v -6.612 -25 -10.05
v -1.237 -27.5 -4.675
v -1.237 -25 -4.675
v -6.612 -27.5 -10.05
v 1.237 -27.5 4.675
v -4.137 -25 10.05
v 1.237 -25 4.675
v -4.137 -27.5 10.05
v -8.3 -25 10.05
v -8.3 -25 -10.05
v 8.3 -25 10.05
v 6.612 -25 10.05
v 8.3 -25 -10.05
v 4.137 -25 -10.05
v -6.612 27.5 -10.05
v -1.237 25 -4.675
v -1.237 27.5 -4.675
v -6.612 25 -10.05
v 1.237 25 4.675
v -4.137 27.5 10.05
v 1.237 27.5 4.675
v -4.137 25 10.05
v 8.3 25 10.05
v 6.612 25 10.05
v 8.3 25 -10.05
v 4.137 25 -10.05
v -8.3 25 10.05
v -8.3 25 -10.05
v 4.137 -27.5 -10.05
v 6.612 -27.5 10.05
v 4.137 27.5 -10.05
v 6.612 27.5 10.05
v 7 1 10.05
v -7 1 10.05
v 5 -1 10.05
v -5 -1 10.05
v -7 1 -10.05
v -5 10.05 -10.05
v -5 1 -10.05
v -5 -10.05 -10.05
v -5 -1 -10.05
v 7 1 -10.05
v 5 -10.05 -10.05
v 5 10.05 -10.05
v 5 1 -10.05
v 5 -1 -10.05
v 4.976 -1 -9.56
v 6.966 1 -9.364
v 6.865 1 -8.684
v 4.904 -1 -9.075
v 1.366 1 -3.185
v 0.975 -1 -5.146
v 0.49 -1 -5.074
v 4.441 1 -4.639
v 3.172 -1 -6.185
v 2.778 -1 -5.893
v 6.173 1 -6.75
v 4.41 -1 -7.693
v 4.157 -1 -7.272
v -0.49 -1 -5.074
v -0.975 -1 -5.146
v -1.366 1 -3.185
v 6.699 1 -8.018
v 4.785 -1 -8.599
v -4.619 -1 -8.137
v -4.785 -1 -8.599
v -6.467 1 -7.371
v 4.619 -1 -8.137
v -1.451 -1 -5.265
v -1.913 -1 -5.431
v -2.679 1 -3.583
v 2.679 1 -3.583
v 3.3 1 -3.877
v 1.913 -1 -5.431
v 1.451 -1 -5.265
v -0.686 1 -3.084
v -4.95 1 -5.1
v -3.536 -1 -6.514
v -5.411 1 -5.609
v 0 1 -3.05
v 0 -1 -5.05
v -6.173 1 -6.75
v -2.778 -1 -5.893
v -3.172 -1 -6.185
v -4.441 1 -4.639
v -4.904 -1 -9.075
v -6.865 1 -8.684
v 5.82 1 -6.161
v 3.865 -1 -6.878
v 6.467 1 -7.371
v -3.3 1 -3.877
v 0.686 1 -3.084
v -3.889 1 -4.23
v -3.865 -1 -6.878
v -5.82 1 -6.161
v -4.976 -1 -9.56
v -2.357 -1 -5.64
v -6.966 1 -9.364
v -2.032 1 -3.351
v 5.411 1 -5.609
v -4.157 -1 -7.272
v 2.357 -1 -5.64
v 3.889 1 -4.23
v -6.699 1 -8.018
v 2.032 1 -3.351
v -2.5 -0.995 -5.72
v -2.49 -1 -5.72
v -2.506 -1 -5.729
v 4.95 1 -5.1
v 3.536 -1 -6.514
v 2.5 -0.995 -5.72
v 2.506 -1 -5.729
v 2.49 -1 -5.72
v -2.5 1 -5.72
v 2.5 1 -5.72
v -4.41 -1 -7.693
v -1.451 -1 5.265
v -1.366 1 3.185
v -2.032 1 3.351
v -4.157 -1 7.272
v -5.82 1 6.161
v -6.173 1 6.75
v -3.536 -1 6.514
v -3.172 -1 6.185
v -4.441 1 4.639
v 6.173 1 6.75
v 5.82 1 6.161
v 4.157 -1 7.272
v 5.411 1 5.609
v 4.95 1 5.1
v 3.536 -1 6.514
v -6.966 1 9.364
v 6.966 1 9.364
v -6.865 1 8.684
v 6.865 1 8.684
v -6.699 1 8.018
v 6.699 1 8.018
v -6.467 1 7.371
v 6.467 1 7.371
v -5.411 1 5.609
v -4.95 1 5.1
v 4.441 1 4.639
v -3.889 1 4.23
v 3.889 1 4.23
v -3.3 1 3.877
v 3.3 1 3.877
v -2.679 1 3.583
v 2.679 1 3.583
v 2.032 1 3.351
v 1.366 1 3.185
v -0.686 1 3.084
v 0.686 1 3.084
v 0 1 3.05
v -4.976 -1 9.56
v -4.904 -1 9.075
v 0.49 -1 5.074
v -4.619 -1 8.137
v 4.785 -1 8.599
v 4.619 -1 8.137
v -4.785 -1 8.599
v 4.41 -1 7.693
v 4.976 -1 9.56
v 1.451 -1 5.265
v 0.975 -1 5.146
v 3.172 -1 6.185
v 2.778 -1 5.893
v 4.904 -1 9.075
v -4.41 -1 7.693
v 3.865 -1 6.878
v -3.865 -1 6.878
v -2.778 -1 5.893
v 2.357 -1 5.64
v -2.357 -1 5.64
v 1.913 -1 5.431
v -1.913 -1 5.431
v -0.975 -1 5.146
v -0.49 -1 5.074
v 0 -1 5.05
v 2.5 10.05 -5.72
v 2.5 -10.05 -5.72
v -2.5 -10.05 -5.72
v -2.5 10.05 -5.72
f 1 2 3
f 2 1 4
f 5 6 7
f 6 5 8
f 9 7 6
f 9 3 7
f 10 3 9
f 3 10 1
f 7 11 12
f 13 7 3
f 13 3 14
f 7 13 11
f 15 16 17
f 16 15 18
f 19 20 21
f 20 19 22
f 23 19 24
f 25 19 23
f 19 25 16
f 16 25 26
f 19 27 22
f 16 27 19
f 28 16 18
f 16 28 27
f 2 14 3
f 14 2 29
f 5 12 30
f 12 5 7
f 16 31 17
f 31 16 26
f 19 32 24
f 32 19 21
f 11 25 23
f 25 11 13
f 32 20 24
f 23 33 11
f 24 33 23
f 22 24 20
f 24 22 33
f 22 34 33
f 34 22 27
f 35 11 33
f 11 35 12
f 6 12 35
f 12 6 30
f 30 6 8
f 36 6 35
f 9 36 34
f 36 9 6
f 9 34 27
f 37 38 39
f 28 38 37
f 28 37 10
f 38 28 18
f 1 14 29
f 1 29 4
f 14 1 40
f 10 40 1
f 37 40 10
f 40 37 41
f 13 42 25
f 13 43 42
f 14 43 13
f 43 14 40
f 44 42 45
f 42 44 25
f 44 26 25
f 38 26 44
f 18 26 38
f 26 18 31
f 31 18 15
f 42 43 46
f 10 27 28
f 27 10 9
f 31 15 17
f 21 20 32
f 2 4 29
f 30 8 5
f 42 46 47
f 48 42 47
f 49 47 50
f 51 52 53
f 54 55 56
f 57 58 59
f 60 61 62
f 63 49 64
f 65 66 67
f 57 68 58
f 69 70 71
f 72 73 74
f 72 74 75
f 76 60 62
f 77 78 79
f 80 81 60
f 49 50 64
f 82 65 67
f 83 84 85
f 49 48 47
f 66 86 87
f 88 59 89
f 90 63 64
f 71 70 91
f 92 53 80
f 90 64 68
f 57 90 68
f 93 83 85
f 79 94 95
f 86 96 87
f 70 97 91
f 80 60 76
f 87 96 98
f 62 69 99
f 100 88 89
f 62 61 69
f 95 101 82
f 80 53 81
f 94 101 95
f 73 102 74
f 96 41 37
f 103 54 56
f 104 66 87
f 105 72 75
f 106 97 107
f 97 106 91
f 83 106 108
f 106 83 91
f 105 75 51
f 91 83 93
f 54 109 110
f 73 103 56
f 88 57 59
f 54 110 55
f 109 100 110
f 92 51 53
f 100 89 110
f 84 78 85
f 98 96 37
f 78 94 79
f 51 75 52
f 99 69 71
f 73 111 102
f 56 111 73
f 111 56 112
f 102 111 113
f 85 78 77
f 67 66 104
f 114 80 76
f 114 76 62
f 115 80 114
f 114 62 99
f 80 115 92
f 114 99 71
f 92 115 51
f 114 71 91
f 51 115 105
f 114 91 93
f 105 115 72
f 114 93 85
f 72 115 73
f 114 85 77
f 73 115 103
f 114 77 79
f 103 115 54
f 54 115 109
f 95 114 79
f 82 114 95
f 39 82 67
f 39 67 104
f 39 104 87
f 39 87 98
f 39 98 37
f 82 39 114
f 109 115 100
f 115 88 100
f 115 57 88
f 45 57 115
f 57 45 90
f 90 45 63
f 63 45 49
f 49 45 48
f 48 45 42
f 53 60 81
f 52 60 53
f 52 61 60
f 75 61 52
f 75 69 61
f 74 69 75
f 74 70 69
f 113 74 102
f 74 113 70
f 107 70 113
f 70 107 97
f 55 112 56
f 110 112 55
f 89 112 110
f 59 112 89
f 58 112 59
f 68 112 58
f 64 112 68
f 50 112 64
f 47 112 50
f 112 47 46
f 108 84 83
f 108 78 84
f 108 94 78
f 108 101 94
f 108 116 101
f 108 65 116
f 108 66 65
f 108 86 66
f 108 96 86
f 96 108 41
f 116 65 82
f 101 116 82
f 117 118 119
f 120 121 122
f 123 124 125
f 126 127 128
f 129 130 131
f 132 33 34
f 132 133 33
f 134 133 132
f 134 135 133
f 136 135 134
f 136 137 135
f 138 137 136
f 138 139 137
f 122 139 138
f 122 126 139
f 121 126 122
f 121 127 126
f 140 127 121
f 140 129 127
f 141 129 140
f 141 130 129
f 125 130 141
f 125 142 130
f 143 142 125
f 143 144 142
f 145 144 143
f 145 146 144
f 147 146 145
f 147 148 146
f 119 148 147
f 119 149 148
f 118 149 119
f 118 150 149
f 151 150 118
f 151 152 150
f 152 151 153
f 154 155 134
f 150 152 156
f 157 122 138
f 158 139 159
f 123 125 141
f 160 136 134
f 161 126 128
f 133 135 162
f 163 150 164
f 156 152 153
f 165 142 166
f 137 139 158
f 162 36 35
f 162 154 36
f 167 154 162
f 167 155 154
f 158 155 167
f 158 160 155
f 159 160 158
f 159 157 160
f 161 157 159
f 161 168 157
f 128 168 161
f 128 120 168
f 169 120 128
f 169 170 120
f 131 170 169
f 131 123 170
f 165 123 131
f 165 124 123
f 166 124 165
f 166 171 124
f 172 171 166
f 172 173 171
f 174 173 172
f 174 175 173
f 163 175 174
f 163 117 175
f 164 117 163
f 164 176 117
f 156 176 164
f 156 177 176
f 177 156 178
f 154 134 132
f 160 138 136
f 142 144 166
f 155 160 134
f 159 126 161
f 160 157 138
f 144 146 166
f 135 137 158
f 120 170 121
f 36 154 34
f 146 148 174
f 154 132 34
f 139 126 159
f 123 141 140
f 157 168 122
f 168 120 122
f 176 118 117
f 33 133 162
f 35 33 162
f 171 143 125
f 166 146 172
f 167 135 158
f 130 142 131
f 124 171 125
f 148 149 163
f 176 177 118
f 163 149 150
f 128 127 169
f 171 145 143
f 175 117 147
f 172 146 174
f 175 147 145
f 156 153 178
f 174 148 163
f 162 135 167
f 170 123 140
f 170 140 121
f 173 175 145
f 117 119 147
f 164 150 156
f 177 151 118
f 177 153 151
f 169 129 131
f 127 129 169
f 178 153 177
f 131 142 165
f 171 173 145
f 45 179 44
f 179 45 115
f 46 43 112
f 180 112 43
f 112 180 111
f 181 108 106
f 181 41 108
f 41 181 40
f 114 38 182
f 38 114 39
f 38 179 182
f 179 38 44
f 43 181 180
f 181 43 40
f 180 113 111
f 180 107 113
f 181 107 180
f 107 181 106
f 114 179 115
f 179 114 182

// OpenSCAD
module chamfered_bar() {
    difference() {
        // Main rectangular bar
        cube([16.6, 55.0, 20.1], center=true);
        
        // Chamfers on the corners
        for (x_shift = [-8.3, 8.3]) {
            for (y_shift = [-27.5, 27.5]) {
                translate([x_shift, y_shift, 0])
                    rotate([0, 45, 0])
                    cube([16.6, 5, 20.1], center=true);
            }
        }
    }
}

module hex_hole_with_countersink() {
    union() {
        // Hexagonal through-hole
        translate([0, 0, -10.05])
            rotate([90, 0, 0])
            cylinder(h=20.1, r=5, $fn=6, center=true);
        
        // V-shaped countersink
        for (z_shift = [-10.05, 10.05]) {
            translate([0, 0, z_shift])
                rotate([90, 0, 0])
                cylinder(h=2, r1=7, r2=5, $fn=64, center=true);
        }
    }
}

difference() {
    chamfered_bar();
    translate([0, 0, 0])
        hex_hole_with_countersink();
}
